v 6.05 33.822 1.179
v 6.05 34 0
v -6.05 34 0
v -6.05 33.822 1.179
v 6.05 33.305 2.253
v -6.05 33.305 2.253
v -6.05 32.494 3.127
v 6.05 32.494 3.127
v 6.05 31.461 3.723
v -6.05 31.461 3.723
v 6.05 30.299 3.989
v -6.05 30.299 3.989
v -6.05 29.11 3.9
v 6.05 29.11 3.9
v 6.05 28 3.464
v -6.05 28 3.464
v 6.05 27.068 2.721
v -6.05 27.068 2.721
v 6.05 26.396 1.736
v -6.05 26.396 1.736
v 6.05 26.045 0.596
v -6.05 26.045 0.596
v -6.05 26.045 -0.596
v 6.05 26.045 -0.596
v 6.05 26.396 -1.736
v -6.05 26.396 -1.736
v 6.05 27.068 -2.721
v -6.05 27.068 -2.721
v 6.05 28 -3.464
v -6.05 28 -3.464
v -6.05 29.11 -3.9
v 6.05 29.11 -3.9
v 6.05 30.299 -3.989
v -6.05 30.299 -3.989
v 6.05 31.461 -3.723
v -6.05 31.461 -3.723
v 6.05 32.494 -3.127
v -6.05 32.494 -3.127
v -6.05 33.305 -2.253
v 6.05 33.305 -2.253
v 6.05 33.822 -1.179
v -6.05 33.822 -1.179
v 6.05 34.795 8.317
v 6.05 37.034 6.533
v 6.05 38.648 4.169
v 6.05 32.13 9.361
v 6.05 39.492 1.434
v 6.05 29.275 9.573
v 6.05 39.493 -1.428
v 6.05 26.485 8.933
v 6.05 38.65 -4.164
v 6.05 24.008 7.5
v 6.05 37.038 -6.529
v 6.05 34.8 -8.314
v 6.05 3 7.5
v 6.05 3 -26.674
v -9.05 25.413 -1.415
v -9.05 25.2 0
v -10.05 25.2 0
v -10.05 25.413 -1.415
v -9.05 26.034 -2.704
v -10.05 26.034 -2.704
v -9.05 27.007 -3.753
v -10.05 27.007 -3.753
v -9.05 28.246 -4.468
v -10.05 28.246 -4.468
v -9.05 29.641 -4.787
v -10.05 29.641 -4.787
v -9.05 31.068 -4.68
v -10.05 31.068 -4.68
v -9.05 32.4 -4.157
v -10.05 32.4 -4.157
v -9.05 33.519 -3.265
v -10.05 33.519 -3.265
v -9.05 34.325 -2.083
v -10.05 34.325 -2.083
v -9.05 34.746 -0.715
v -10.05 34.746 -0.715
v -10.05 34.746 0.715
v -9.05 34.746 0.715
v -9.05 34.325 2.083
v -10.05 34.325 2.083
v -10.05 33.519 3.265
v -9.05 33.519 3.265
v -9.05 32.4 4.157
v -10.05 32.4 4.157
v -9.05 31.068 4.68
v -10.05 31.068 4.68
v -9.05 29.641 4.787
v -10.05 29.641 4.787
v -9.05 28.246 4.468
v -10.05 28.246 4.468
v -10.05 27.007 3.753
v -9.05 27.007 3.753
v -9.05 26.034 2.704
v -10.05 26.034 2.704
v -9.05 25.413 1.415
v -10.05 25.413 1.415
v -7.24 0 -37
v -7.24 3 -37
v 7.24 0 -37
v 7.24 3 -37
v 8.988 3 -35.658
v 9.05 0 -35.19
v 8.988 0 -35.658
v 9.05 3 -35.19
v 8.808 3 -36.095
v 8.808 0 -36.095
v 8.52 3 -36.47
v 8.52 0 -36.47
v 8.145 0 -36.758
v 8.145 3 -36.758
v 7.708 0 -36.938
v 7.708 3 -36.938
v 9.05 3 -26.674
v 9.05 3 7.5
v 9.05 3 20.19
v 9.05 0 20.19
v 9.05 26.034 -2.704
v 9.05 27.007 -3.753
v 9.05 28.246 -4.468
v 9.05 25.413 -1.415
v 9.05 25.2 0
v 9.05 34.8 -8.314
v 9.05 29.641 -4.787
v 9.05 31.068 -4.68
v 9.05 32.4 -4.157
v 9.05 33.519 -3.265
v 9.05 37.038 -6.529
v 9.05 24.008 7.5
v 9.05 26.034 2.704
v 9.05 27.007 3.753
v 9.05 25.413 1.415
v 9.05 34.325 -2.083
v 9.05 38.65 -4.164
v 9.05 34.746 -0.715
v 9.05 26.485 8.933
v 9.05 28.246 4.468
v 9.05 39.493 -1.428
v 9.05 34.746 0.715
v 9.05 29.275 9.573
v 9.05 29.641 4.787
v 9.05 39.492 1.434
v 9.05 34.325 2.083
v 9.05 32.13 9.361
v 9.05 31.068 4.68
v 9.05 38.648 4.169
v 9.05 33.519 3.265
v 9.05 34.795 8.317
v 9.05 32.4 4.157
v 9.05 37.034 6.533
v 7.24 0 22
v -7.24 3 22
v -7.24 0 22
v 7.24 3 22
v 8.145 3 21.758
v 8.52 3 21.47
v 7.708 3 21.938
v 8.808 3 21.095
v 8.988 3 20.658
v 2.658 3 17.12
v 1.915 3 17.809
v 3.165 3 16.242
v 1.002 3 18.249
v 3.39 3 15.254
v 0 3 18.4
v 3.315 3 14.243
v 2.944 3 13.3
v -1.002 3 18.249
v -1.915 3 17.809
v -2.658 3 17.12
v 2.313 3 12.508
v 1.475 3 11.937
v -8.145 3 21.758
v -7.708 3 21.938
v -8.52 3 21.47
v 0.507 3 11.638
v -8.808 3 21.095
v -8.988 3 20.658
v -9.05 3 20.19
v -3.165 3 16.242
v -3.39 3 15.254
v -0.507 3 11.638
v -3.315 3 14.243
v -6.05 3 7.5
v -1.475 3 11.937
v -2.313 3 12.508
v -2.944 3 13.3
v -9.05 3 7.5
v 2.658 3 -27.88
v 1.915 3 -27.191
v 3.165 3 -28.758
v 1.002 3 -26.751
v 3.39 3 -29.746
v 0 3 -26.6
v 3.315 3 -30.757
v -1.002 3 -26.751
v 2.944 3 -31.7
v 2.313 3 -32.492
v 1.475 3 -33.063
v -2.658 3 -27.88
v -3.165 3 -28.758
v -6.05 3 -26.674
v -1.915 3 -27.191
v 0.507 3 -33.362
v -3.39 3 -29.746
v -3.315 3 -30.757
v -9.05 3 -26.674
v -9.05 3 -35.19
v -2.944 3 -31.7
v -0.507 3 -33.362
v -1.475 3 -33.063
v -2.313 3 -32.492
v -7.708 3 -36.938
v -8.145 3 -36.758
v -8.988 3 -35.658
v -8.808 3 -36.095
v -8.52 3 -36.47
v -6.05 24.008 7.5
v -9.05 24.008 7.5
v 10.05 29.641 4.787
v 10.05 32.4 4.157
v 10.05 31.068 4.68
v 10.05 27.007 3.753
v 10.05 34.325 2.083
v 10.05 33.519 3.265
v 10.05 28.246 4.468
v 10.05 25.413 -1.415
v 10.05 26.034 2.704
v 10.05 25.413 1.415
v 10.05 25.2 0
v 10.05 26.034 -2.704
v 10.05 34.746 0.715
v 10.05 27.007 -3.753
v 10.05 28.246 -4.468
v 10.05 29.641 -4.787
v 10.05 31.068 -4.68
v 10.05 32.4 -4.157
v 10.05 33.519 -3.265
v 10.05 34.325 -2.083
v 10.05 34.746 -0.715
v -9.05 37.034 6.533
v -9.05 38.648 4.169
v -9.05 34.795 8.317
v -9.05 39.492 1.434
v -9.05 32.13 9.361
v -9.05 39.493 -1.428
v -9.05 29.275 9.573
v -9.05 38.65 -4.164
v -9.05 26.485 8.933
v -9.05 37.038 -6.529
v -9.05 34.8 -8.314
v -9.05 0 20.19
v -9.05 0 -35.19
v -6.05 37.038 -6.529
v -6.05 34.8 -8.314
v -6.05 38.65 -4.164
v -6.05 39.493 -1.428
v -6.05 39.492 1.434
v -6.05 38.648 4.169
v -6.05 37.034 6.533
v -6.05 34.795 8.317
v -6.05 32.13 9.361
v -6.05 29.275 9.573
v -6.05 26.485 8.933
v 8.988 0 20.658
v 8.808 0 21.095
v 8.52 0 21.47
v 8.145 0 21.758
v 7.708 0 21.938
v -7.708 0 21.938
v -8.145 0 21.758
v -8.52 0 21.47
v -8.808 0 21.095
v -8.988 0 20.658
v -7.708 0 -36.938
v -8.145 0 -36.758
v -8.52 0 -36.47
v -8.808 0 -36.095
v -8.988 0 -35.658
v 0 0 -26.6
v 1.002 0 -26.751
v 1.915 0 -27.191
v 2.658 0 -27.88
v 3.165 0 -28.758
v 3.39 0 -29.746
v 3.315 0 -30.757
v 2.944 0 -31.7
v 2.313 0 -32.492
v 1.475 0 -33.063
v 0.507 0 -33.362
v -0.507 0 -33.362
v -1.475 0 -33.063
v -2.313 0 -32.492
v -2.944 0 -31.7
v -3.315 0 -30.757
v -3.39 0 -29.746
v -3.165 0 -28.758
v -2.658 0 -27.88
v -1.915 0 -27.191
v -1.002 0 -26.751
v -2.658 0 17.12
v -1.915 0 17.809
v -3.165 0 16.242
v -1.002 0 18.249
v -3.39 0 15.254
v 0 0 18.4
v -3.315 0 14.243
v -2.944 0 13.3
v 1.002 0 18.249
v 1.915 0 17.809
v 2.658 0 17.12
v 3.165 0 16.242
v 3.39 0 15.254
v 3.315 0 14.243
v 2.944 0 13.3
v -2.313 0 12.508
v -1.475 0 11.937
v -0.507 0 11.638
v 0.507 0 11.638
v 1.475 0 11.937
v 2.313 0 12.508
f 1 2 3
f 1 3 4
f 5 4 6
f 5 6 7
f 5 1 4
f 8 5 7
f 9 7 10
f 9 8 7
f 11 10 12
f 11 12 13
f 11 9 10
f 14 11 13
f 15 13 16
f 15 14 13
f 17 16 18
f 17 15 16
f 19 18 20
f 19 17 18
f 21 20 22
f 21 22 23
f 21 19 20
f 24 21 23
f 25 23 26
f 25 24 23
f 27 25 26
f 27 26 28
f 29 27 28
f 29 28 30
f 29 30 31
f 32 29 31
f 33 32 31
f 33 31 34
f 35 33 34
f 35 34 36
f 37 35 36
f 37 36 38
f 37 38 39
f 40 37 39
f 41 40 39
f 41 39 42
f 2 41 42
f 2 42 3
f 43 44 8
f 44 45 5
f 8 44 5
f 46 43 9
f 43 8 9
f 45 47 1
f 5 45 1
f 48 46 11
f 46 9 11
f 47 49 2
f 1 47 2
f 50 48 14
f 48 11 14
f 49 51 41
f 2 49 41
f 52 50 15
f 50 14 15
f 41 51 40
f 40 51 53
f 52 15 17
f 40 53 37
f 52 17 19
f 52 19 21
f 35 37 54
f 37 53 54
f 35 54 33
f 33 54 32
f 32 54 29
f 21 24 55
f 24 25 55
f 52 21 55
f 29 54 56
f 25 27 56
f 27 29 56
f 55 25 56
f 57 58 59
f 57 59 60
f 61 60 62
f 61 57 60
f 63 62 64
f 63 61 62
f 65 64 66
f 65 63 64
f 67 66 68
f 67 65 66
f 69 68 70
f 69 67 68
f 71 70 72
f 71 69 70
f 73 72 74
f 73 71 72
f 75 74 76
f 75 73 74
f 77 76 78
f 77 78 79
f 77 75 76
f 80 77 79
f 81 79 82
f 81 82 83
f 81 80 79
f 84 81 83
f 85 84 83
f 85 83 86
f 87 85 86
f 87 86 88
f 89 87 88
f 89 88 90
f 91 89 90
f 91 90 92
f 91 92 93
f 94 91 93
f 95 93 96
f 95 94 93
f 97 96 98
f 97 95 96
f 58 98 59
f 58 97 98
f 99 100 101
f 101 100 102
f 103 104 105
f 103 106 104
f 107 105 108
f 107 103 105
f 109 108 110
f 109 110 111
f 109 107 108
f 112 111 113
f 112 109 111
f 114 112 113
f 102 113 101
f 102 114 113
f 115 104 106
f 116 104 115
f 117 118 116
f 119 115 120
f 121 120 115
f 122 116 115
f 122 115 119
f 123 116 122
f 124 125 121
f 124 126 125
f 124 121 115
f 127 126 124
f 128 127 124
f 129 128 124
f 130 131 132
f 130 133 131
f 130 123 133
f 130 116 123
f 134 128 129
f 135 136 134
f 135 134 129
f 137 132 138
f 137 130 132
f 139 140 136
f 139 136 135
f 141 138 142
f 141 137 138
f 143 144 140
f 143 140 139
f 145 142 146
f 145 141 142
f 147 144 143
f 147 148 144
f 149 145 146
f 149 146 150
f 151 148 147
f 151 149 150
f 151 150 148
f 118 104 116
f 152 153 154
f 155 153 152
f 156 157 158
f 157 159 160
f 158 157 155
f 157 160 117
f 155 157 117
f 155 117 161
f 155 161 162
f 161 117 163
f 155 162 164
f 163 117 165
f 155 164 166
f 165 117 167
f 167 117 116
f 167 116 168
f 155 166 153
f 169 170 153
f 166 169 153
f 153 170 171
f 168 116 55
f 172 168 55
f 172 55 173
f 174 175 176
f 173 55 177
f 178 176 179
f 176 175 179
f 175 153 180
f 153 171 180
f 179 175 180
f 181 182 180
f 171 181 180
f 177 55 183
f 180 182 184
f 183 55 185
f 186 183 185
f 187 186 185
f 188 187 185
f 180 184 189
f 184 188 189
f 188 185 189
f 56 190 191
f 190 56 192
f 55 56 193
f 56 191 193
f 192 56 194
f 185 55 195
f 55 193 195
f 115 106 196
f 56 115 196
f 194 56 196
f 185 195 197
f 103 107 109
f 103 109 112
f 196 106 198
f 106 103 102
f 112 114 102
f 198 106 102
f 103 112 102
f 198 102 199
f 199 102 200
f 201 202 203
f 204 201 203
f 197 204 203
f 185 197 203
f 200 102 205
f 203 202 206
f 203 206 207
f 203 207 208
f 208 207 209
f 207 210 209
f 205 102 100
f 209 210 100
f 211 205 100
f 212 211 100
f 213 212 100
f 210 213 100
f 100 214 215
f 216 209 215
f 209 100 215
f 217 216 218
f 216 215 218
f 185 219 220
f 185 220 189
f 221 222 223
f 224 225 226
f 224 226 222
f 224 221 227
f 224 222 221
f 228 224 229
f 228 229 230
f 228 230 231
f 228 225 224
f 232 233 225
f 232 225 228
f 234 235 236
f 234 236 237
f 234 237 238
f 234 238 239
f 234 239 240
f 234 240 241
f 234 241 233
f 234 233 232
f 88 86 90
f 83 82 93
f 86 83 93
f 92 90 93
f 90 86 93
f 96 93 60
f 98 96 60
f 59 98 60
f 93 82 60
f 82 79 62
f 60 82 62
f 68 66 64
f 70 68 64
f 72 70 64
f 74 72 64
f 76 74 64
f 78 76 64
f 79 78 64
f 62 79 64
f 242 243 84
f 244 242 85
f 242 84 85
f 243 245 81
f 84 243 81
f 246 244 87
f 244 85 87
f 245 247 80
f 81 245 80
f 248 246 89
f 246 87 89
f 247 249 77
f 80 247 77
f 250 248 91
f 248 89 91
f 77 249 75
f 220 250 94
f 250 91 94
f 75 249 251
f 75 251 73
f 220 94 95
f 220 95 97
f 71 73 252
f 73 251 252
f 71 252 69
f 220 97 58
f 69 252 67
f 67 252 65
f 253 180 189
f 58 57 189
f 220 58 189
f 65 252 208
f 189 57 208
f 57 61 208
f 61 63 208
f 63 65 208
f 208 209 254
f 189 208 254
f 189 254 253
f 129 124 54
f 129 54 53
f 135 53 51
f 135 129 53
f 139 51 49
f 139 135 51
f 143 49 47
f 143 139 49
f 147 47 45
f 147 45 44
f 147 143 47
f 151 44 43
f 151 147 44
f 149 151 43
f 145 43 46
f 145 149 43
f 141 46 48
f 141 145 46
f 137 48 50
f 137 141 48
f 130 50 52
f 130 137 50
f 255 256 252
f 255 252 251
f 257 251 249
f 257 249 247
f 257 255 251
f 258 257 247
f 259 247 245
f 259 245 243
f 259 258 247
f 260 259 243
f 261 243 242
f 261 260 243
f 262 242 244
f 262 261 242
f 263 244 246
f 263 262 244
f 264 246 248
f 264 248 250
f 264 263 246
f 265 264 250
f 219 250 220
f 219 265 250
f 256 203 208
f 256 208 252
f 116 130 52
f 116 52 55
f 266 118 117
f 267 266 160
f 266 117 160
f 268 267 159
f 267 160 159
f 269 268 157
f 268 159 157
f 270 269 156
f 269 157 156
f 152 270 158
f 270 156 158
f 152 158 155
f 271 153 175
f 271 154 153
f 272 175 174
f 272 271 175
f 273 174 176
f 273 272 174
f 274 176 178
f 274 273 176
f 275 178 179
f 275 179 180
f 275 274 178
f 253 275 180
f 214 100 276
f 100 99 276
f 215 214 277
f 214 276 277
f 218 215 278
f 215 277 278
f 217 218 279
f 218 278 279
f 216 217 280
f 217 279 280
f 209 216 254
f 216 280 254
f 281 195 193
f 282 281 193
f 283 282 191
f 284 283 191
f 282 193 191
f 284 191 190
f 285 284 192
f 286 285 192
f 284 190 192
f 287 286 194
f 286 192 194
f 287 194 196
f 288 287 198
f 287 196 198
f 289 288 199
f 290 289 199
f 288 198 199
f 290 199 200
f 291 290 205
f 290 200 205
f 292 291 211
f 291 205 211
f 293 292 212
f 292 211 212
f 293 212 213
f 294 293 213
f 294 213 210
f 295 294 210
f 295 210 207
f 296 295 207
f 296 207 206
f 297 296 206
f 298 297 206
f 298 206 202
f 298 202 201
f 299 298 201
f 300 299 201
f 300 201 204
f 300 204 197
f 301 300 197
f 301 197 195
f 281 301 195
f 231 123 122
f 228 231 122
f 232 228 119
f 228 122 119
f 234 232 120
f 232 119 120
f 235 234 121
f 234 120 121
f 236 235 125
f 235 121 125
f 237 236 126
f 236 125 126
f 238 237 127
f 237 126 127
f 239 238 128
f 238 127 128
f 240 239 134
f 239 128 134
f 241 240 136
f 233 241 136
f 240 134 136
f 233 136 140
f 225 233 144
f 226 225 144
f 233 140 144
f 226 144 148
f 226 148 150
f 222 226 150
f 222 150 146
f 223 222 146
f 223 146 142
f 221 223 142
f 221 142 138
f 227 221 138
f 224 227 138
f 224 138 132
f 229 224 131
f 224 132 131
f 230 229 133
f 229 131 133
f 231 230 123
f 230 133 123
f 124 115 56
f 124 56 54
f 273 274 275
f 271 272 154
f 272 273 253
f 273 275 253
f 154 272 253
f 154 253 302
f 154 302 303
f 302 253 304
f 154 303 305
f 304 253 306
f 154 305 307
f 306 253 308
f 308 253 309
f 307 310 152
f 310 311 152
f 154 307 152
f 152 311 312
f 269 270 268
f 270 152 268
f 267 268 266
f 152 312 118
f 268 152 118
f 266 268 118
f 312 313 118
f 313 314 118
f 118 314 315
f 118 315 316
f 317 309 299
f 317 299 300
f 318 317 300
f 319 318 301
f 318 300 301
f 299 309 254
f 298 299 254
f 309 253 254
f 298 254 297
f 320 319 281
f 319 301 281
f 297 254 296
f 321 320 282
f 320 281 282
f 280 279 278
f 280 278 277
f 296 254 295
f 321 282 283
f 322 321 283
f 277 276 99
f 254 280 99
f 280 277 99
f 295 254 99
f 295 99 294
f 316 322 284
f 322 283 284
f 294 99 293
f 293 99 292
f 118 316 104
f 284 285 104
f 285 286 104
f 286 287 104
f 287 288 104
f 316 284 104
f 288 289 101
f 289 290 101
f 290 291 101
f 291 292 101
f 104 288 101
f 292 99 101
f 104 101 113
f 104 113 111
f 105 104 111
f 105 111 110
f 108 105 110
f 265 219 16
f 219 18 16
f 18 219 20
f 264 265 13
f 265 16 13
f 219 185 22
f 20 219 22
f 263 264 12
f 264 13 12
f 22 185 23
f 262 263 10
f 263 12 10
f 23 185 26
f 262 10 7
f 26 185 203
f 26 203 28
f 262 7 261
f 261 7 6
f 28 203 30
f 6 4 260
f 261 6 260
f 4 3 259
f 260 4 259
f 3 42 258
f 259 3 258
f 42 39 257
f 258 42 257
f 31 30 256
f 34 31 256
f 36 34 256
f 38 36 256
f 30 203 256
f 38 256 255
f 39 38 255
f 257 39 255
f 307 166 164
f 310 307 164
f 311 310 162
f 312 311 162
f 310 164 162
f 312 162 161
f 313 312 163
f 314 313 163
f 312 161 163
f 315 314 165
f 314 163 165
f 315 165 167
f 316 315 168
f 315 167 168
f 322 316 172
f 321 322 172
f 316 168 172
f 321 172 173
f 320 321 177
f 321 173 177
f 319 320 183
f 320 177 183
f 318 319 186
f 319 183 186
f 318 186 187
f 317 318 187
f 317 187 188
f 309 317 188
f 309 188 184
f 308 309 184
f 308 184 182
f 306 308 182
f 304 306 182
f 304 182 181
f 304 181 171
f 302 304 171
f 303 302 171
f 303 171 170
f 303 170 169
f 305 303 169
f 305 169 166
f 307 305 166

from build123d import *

# Parameters (mm, degrees)
EXTRUDE_START       = -37
EXTRUDE_1_DEPTH     = 59
CUT_EXTRUDE_1_DEPTH = 58.416112721
SKETCH_5_R          = 4
EXTRUDE_2_DEPTH     = 15.1
SKETCH_6_R          = 4.8
EXTRUDE_3_DEPTH     = 1
FILLET_1_R          = 1.81
SKETCH_7_R          = 3.4
CUT_EXTRUDE_2_DEPTH = 54.005306338


with BuildPart() as part:
    # 草图3 → 凸台-拉伸1 (new body)
    with BuildSketch(Plane.XY.offset(EXTRUDE_START)):
        Polygon((-6.05, 3), (-6.05, 40), (-9.05, 40), (-9.05, 0), (9.05, 0), (9.05, 40), (6.05, 40), (6.05, 3), align=None)
    extrude(amount=EXTRUDE_1_DEPTH)

    # 草图4 → 切除-拉伸1 (cut, through all)
    with BuildSketch(Plane(origin=(9.05, 0, 0), x_dir=(0, 0, -1), z_dir=(1, 0, 0))):
        with BuildLine():
            Line((-7.5, 24.007504693), (-7.5, 3))
            Line((-7.5, 3), (-22, 3))
            Line((-22, 3), (-22, 40))
            Line((-22, 40), (37, 40))
            Line((37, 40), (37, 3))
            Line((37, 3), (26.673582437, 3))
            Line((26.673582437, 3), (8.313843876, 34.8))
            ThreePointArc((8.313843876, 34.8), (-5.411568553, 37.929371085), (-7.5, 24.007504693))
        make_face()
    extrude(amount=-CUT_EXTRUDE_1_DEPTH, mode=Mode.SUBTRACT)

    # 草图5 → 凸台-拉伸2 (add)
    with BuildSketch(Plane(origin=(9.05, 0, 0), x_dir=(0, 0, -1), z_dir=(1, 0, 0))):
        with Locations(Location((0, 30, 0), (0, 0, 90))):
            Circle(SKETCH_5_R)
    extrude(amount=-EXTRUDE_2_DEPTH)

    # 草图6 → 凸台-拉伸3 (add)
    with BuildSketch(Plane(origin=(9.05, 0, 0), x_dir=(0, 0, -1), z_dir=(1, 0, 0))):
        with Locations(Location((0, 30, 0), (0, 0, 270))):
            Circle(SKETCH_6_R)
    extrude_3 = extrude(amount=EXTRUDE_3_DEPTH)

    # 镜向1: 凸台-拉伸3 across plane
    add(extrude_3.mirror(Plane(origin=(0, 0, 0), x_dir=(0, 0, 1), z_dir=(1, 0, 0))))

    # 圆角1
    fillet_1_edges = [part.edges().sort_by_distance(p)[0] for p in [
        (9.05, 1.5, 22),
        (-9.05, 1.5, -37),
        (-9.05, 1.5, 22),
        (9.05, 1.5, -37),
    ]]
    fillet(fillet_1_edges, radius=FILLET_1_R)

    # 草图7 → 切除-拉伸2 (cut, through all)
    with BuildSketch(Plane(origin=(0, 3, 0), x_dir=(1, 0, 0), z_dir=(0, 1, 0))):
        with Locations(Location((0, -15, 0), (0, 0, 270))):
            Circle(SKETCH_7_R)
        with Locations(Location((0, 30, 0), (0, 0, 270))):
            Circle(SKETCH_7_R)
    extrude(amount=-CUT_EXTRUDE_2_DEPTH, mode=Mode.SUBTRACT)


solid = part.part
